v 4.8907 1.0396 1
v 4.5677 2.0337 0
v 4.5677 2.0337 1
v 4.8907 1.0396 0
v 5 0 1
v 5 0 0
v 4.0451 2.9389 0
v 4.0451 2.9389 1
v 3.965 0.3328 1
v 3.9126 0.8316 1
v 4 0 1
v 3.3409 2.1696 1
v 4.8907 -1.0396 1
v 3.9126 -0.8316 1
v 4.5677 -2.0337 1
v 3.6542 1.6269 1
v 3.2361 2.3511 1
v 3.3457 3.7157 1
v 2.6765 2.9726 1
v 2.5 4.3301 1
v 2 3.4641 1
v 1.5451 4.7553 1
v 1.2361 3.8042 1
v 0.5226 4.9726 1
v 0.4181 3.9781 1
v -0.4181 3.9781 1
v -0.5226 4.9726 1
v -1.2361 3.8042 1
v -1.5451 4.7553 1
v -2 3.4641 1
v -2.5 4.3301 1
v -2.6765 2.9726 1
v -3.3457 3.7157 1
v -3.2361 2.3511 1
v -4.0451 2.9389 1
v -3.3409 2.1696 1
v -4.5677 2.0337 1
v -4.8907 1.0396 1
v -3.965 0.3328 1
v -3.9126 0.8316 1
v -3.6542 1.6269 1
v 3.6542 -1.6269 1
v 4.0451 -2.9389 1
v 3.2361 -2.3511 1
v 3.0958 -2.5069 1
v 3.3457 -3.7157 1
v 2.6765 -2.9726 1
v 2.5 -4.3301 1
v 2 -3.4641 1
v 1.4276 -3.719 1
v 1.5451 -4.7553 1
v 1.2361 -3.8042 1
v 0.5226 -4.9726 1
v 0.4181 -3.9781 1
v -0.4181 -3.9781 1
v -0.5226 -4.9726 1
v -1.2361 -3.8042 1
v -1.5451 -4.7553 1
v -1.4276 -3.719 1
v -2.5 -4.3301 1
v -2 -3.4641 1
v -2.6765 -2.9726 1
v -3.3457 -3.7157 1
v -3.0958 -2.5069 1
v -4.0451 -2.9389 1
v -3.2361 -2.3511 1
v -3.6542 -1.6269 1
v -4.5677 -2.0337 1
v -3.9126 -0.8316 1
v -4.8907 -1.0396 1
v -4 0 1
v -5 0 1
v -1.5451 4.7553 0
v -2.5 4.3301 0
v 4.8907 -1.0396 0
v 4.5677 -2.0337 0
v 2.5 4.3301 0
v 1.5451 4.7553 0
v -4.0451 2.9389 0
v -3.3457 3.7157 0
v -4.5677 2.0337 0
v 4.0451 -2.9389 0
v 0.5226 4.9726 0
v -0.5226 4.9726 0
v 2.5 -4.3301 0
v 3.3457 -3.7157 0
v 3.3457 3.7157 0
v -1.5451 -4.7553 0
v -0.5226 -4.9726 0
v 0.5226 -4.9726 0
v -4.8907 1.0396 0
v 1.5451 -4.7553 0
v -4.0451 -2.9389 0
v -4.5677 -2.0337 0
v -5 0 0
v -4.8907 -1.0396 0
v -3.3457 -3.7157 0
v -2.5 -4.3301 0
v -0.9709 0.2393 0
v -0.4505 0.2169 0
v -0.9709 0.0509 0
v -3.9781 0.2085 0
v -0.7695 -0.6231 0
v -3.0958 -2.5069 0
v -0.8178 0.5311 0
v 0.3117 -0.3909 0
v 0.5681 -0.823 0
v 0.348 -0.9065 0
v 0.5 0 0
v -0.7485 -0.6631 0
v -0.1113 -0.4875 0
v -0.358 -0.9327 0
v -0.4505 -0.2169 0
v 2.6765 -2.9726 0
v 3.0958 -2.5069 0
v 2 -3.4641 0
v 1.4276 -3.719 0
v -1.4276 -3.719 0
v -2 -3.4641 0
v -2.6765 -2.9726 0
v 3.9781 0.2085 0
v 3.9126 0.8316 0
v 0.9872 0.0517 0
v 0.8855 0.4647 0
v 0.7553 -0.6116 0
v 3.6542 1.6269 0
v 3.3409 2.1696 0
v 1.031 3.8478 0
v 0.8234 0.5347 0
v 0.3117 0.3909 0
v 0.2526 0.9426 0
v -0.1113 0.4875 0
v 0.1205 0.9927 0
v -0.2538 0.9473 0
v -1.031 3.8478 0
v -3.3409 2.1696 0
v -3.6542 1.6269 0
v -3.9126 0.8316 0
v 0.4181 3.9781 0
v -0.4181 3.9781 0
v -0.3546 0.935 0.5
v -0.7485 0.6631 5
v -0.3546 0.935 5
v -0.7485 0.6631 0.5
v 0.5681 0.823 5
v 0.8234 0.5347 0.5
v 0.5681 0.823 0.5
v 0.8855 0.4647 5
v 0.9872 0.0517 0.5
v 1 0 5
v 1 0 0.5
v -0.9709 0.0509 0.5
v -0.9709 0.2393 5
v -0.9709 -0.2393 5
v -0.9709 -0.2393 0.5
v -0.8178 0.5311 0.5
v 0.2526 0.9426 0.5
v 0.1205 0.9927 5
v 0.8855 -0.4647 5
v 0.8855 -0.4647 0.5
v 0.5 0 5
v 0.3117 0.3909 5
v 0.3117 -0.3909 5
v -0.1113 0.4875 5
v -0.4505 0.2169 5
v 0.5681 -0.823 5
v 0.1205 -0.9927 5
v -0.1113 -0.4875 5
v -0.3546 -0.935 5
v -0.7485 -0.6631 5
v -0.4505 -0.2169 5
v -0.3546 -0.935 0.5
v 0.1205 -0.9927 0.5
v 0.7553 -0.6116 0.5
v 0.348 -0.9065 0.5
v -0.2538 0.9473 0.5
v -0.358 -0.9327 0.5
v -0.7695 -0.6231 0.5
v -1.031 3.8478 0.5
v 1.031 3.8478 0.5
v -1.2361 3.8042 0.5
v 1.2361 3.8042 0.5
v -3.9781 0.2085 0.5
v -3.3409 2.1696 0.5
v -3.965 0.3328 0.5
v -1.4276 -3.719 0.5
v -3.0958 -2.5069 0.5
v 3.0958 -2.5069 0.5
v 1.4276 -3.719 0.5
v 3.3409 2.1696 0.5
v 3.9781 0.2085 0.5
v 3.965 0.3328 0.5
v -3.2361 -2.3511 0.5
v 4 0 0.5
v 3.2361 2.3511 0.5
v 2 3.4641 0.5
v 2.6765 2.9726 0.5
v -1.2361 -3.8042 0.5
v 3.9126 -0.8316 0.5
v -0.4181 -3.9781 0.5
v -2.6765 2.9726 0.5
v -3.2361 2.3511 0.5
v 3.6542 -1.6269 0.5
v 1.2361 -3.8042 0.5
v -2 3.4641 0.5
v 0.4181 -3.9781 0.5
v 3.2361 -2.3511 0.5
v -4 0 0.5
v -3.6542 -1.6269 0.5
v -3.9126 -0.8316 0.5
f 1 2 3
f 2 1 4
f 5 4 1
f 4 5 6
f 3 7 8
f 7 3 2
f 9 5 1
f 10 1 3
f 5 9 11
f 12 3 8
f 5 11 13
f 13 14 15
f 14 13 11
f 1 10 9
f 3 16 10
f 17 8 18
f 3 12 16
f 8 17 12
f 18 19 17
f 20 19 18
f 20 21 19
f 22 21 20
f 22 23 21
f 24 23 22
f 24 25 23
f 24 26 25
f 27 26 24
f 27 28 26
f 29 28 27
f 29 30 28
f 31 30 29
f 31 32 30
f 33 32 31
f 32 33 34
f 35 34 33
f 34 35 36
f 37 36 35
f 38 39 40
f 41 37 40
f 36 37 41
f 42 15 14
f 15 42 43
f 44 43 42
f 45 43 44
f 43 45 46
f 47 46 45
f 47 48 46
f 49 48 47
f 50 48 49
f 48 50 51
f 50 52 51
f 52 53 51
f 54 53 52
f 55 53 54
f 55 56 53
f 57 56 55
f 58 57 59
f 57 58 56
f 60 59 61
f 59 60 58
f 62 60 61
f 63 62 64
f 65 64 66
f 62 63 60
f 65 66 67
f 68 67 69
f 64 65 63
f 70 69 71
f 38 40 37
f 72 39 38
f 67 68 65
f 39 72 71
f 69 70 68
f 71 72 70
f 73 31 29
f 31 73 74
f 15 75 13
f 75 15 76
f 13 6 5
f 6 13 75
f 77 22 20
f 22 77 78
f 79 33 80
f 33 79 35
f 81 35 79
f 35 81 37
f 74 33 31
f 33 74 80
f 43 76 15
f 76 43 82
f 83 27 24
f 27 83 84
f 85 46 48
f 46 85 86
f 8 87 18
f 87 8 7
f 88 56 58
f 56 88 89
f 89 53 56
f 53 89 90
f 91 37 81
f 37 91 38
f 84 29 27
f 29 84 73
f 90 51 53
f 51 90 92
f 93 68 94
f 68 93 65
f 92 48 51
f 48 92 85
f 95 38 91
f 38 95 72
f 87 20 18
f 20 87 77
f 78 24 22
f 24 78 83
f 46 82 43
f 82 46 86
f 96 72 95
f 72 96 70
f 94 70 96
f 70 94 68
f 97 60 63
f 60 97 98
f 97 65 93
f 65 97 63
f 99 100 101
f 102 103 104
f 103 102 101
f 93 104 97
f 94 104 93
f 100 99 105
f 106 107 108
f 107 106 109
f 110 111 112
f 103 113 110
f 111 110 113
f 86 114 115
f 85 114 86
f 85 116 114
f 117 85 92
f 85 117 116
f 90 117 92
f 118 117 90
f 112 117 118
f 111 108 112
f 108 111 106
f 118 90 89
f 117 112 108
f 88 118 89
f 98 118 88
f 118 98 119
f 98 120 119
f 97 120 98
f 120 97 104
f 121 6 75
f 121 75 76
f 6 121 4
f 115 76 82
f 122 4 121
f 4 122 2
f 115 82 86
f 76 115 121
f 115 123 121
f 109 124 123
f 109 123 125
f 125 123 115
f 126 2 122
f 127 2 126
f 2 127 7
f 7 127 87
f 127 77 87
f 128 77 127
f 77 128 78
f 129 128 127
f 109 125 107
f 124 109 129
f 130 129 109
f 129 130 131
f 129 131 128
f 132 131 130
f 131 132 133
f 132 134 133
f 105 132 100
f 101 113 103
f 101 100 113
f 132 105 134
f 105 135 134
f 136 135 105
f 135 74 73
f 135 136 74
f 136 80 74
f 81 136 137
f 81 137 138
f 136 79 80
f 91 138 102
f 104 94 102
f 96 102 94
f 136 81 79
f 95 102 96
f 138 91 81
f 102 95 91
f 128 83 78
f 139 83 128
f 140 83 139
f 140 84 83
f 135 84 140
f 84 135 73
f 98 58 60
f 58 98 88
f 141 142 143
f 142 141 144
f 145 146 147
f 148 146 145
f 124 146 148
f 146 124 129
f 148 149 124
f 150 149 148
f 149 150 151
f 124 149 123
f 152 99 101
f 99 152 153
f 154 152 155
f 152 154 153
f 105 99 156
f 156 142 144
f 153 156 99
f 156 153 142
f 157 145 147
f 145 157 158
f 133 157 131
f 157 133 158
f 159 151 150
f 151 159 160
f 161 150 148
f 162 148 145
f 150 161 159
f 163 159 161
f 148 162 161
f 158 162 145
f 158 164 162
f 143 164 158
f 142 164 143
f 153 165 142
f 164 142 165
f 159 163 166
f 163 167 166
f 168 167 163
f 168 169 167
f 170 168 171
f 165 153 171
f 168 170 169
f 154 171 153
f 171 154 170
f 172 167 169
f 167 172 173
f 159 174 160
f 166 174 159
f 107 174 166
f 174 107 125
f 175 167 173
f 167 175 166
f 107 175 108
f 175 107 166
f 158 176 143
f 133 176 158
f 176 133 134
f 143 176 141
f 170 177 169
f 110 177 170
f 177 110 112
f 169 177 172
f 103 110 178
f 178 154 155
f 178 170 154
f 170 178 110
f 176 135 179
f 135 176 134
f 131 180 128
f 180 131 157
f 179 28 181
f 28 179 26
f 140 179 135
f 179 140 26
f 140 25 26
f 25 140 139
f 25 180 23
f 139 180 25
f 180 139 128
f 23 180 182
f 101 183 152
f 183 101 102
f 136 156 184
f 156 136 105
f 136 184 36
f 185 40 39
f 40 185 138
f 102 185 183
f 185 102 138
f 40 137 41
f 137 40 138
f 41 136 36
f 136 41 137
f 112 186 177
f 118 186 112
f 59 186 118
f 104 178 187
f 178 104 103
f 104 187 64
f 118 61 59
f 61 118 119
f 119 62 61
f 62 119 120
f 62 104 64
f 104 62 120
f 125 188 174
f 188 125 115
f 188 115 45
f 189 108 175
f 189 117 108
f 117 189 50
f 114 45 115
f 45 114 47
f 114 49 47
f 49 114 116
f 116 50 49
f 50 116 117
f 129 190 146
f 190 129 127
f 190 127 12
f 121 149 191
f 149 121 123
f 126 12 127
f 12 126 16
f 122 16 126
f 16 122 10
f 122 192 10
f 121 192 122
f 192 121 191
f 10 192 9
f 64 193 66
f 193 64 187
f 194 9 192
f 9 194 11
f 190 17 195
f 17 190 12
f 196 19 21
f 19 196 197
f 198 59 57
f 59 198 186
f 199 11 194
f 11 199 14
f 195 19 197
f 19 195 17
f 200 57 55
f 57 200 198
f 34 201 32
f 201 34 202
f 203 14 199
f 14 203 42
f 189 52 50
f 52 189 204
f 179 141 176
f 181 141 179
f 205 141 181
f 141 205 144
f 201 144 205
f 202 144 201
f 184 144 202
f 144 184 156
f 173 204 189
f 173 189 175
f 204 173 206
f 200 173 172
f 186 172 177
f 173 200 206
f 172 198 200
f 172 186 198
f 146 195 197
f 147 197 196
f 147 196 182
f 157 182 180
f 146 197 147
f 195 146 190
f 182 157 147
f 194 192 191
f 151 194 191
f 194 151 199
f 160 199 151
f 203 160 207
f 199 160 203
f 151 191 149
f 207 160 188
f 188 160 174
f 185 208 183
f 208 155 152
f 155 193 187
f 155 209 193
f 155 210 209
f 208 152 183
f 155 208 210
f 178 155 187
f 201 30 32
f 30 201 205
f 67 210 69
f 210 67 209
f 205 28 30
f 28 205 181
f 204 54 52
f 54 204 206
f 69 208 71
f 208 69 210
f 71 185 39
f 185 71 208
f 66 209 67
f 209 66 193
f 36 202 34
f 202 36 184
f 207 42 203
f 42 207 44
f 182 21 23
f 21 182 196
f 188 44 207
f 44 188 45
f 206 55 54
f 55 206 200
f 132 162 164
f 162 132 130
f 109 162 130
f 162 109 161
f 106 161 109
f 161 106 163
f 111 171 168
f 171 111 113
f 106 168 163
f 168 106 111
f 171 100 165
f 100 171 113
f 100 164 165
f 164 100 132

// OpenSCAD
$fs = 0.5;

module isosceles_triangle(length=1, height=1, angle=60) {
	linear_extrude(height=height)
		polygon(points=[[0, 0],length*[sin(angle), cos(angle)], length*[-sin(angle),cos(angle)]]);
}

module rounded_triangle(radius=1, height=1, angle=60) {
	intersection() {
		isosceles_triangle(2 * radius / cos(angle/2), height, angle);
		cylinder(r=radius, h=height);
	}
}

wheel_radius = 5;
wheel_width = 1;
wheel_rim_thickness = 1;
wheel_rim_width = wheel_width / 2;
shaft_radius = 1;
hole_radius = shaft_radius / 2;
shaft_length = 4;
hole_length = shaft_length + wheel_width;
num_spokes = 5;
spoke_angle = 15;

difference() {
	union() {
		cylinder(h=1, r=wheel_radius);
		translate([0, 0, wheel_width])
			cylinder(h=shaft_length, r=shaft_radius);
	}
	cylinder(h=hole_length, r=hole_radius);
	difference() {
		union() {
			translate([0, 0, wheel_rim_width])
				cylinder(h=wheel_width - wheel_rim_width, r=wheel_radius - wheel_rim_thickness);
			for (n = [0 : num_spokes]) {
				rotate(360 / num_spokes * n)
					rounded_triangle(wheel_radius - wheel_rim_thickness, 1, spoke_angle);
			}
		}
		cylinder(h=wheel_width, r=shaft_radius);
	}
}
